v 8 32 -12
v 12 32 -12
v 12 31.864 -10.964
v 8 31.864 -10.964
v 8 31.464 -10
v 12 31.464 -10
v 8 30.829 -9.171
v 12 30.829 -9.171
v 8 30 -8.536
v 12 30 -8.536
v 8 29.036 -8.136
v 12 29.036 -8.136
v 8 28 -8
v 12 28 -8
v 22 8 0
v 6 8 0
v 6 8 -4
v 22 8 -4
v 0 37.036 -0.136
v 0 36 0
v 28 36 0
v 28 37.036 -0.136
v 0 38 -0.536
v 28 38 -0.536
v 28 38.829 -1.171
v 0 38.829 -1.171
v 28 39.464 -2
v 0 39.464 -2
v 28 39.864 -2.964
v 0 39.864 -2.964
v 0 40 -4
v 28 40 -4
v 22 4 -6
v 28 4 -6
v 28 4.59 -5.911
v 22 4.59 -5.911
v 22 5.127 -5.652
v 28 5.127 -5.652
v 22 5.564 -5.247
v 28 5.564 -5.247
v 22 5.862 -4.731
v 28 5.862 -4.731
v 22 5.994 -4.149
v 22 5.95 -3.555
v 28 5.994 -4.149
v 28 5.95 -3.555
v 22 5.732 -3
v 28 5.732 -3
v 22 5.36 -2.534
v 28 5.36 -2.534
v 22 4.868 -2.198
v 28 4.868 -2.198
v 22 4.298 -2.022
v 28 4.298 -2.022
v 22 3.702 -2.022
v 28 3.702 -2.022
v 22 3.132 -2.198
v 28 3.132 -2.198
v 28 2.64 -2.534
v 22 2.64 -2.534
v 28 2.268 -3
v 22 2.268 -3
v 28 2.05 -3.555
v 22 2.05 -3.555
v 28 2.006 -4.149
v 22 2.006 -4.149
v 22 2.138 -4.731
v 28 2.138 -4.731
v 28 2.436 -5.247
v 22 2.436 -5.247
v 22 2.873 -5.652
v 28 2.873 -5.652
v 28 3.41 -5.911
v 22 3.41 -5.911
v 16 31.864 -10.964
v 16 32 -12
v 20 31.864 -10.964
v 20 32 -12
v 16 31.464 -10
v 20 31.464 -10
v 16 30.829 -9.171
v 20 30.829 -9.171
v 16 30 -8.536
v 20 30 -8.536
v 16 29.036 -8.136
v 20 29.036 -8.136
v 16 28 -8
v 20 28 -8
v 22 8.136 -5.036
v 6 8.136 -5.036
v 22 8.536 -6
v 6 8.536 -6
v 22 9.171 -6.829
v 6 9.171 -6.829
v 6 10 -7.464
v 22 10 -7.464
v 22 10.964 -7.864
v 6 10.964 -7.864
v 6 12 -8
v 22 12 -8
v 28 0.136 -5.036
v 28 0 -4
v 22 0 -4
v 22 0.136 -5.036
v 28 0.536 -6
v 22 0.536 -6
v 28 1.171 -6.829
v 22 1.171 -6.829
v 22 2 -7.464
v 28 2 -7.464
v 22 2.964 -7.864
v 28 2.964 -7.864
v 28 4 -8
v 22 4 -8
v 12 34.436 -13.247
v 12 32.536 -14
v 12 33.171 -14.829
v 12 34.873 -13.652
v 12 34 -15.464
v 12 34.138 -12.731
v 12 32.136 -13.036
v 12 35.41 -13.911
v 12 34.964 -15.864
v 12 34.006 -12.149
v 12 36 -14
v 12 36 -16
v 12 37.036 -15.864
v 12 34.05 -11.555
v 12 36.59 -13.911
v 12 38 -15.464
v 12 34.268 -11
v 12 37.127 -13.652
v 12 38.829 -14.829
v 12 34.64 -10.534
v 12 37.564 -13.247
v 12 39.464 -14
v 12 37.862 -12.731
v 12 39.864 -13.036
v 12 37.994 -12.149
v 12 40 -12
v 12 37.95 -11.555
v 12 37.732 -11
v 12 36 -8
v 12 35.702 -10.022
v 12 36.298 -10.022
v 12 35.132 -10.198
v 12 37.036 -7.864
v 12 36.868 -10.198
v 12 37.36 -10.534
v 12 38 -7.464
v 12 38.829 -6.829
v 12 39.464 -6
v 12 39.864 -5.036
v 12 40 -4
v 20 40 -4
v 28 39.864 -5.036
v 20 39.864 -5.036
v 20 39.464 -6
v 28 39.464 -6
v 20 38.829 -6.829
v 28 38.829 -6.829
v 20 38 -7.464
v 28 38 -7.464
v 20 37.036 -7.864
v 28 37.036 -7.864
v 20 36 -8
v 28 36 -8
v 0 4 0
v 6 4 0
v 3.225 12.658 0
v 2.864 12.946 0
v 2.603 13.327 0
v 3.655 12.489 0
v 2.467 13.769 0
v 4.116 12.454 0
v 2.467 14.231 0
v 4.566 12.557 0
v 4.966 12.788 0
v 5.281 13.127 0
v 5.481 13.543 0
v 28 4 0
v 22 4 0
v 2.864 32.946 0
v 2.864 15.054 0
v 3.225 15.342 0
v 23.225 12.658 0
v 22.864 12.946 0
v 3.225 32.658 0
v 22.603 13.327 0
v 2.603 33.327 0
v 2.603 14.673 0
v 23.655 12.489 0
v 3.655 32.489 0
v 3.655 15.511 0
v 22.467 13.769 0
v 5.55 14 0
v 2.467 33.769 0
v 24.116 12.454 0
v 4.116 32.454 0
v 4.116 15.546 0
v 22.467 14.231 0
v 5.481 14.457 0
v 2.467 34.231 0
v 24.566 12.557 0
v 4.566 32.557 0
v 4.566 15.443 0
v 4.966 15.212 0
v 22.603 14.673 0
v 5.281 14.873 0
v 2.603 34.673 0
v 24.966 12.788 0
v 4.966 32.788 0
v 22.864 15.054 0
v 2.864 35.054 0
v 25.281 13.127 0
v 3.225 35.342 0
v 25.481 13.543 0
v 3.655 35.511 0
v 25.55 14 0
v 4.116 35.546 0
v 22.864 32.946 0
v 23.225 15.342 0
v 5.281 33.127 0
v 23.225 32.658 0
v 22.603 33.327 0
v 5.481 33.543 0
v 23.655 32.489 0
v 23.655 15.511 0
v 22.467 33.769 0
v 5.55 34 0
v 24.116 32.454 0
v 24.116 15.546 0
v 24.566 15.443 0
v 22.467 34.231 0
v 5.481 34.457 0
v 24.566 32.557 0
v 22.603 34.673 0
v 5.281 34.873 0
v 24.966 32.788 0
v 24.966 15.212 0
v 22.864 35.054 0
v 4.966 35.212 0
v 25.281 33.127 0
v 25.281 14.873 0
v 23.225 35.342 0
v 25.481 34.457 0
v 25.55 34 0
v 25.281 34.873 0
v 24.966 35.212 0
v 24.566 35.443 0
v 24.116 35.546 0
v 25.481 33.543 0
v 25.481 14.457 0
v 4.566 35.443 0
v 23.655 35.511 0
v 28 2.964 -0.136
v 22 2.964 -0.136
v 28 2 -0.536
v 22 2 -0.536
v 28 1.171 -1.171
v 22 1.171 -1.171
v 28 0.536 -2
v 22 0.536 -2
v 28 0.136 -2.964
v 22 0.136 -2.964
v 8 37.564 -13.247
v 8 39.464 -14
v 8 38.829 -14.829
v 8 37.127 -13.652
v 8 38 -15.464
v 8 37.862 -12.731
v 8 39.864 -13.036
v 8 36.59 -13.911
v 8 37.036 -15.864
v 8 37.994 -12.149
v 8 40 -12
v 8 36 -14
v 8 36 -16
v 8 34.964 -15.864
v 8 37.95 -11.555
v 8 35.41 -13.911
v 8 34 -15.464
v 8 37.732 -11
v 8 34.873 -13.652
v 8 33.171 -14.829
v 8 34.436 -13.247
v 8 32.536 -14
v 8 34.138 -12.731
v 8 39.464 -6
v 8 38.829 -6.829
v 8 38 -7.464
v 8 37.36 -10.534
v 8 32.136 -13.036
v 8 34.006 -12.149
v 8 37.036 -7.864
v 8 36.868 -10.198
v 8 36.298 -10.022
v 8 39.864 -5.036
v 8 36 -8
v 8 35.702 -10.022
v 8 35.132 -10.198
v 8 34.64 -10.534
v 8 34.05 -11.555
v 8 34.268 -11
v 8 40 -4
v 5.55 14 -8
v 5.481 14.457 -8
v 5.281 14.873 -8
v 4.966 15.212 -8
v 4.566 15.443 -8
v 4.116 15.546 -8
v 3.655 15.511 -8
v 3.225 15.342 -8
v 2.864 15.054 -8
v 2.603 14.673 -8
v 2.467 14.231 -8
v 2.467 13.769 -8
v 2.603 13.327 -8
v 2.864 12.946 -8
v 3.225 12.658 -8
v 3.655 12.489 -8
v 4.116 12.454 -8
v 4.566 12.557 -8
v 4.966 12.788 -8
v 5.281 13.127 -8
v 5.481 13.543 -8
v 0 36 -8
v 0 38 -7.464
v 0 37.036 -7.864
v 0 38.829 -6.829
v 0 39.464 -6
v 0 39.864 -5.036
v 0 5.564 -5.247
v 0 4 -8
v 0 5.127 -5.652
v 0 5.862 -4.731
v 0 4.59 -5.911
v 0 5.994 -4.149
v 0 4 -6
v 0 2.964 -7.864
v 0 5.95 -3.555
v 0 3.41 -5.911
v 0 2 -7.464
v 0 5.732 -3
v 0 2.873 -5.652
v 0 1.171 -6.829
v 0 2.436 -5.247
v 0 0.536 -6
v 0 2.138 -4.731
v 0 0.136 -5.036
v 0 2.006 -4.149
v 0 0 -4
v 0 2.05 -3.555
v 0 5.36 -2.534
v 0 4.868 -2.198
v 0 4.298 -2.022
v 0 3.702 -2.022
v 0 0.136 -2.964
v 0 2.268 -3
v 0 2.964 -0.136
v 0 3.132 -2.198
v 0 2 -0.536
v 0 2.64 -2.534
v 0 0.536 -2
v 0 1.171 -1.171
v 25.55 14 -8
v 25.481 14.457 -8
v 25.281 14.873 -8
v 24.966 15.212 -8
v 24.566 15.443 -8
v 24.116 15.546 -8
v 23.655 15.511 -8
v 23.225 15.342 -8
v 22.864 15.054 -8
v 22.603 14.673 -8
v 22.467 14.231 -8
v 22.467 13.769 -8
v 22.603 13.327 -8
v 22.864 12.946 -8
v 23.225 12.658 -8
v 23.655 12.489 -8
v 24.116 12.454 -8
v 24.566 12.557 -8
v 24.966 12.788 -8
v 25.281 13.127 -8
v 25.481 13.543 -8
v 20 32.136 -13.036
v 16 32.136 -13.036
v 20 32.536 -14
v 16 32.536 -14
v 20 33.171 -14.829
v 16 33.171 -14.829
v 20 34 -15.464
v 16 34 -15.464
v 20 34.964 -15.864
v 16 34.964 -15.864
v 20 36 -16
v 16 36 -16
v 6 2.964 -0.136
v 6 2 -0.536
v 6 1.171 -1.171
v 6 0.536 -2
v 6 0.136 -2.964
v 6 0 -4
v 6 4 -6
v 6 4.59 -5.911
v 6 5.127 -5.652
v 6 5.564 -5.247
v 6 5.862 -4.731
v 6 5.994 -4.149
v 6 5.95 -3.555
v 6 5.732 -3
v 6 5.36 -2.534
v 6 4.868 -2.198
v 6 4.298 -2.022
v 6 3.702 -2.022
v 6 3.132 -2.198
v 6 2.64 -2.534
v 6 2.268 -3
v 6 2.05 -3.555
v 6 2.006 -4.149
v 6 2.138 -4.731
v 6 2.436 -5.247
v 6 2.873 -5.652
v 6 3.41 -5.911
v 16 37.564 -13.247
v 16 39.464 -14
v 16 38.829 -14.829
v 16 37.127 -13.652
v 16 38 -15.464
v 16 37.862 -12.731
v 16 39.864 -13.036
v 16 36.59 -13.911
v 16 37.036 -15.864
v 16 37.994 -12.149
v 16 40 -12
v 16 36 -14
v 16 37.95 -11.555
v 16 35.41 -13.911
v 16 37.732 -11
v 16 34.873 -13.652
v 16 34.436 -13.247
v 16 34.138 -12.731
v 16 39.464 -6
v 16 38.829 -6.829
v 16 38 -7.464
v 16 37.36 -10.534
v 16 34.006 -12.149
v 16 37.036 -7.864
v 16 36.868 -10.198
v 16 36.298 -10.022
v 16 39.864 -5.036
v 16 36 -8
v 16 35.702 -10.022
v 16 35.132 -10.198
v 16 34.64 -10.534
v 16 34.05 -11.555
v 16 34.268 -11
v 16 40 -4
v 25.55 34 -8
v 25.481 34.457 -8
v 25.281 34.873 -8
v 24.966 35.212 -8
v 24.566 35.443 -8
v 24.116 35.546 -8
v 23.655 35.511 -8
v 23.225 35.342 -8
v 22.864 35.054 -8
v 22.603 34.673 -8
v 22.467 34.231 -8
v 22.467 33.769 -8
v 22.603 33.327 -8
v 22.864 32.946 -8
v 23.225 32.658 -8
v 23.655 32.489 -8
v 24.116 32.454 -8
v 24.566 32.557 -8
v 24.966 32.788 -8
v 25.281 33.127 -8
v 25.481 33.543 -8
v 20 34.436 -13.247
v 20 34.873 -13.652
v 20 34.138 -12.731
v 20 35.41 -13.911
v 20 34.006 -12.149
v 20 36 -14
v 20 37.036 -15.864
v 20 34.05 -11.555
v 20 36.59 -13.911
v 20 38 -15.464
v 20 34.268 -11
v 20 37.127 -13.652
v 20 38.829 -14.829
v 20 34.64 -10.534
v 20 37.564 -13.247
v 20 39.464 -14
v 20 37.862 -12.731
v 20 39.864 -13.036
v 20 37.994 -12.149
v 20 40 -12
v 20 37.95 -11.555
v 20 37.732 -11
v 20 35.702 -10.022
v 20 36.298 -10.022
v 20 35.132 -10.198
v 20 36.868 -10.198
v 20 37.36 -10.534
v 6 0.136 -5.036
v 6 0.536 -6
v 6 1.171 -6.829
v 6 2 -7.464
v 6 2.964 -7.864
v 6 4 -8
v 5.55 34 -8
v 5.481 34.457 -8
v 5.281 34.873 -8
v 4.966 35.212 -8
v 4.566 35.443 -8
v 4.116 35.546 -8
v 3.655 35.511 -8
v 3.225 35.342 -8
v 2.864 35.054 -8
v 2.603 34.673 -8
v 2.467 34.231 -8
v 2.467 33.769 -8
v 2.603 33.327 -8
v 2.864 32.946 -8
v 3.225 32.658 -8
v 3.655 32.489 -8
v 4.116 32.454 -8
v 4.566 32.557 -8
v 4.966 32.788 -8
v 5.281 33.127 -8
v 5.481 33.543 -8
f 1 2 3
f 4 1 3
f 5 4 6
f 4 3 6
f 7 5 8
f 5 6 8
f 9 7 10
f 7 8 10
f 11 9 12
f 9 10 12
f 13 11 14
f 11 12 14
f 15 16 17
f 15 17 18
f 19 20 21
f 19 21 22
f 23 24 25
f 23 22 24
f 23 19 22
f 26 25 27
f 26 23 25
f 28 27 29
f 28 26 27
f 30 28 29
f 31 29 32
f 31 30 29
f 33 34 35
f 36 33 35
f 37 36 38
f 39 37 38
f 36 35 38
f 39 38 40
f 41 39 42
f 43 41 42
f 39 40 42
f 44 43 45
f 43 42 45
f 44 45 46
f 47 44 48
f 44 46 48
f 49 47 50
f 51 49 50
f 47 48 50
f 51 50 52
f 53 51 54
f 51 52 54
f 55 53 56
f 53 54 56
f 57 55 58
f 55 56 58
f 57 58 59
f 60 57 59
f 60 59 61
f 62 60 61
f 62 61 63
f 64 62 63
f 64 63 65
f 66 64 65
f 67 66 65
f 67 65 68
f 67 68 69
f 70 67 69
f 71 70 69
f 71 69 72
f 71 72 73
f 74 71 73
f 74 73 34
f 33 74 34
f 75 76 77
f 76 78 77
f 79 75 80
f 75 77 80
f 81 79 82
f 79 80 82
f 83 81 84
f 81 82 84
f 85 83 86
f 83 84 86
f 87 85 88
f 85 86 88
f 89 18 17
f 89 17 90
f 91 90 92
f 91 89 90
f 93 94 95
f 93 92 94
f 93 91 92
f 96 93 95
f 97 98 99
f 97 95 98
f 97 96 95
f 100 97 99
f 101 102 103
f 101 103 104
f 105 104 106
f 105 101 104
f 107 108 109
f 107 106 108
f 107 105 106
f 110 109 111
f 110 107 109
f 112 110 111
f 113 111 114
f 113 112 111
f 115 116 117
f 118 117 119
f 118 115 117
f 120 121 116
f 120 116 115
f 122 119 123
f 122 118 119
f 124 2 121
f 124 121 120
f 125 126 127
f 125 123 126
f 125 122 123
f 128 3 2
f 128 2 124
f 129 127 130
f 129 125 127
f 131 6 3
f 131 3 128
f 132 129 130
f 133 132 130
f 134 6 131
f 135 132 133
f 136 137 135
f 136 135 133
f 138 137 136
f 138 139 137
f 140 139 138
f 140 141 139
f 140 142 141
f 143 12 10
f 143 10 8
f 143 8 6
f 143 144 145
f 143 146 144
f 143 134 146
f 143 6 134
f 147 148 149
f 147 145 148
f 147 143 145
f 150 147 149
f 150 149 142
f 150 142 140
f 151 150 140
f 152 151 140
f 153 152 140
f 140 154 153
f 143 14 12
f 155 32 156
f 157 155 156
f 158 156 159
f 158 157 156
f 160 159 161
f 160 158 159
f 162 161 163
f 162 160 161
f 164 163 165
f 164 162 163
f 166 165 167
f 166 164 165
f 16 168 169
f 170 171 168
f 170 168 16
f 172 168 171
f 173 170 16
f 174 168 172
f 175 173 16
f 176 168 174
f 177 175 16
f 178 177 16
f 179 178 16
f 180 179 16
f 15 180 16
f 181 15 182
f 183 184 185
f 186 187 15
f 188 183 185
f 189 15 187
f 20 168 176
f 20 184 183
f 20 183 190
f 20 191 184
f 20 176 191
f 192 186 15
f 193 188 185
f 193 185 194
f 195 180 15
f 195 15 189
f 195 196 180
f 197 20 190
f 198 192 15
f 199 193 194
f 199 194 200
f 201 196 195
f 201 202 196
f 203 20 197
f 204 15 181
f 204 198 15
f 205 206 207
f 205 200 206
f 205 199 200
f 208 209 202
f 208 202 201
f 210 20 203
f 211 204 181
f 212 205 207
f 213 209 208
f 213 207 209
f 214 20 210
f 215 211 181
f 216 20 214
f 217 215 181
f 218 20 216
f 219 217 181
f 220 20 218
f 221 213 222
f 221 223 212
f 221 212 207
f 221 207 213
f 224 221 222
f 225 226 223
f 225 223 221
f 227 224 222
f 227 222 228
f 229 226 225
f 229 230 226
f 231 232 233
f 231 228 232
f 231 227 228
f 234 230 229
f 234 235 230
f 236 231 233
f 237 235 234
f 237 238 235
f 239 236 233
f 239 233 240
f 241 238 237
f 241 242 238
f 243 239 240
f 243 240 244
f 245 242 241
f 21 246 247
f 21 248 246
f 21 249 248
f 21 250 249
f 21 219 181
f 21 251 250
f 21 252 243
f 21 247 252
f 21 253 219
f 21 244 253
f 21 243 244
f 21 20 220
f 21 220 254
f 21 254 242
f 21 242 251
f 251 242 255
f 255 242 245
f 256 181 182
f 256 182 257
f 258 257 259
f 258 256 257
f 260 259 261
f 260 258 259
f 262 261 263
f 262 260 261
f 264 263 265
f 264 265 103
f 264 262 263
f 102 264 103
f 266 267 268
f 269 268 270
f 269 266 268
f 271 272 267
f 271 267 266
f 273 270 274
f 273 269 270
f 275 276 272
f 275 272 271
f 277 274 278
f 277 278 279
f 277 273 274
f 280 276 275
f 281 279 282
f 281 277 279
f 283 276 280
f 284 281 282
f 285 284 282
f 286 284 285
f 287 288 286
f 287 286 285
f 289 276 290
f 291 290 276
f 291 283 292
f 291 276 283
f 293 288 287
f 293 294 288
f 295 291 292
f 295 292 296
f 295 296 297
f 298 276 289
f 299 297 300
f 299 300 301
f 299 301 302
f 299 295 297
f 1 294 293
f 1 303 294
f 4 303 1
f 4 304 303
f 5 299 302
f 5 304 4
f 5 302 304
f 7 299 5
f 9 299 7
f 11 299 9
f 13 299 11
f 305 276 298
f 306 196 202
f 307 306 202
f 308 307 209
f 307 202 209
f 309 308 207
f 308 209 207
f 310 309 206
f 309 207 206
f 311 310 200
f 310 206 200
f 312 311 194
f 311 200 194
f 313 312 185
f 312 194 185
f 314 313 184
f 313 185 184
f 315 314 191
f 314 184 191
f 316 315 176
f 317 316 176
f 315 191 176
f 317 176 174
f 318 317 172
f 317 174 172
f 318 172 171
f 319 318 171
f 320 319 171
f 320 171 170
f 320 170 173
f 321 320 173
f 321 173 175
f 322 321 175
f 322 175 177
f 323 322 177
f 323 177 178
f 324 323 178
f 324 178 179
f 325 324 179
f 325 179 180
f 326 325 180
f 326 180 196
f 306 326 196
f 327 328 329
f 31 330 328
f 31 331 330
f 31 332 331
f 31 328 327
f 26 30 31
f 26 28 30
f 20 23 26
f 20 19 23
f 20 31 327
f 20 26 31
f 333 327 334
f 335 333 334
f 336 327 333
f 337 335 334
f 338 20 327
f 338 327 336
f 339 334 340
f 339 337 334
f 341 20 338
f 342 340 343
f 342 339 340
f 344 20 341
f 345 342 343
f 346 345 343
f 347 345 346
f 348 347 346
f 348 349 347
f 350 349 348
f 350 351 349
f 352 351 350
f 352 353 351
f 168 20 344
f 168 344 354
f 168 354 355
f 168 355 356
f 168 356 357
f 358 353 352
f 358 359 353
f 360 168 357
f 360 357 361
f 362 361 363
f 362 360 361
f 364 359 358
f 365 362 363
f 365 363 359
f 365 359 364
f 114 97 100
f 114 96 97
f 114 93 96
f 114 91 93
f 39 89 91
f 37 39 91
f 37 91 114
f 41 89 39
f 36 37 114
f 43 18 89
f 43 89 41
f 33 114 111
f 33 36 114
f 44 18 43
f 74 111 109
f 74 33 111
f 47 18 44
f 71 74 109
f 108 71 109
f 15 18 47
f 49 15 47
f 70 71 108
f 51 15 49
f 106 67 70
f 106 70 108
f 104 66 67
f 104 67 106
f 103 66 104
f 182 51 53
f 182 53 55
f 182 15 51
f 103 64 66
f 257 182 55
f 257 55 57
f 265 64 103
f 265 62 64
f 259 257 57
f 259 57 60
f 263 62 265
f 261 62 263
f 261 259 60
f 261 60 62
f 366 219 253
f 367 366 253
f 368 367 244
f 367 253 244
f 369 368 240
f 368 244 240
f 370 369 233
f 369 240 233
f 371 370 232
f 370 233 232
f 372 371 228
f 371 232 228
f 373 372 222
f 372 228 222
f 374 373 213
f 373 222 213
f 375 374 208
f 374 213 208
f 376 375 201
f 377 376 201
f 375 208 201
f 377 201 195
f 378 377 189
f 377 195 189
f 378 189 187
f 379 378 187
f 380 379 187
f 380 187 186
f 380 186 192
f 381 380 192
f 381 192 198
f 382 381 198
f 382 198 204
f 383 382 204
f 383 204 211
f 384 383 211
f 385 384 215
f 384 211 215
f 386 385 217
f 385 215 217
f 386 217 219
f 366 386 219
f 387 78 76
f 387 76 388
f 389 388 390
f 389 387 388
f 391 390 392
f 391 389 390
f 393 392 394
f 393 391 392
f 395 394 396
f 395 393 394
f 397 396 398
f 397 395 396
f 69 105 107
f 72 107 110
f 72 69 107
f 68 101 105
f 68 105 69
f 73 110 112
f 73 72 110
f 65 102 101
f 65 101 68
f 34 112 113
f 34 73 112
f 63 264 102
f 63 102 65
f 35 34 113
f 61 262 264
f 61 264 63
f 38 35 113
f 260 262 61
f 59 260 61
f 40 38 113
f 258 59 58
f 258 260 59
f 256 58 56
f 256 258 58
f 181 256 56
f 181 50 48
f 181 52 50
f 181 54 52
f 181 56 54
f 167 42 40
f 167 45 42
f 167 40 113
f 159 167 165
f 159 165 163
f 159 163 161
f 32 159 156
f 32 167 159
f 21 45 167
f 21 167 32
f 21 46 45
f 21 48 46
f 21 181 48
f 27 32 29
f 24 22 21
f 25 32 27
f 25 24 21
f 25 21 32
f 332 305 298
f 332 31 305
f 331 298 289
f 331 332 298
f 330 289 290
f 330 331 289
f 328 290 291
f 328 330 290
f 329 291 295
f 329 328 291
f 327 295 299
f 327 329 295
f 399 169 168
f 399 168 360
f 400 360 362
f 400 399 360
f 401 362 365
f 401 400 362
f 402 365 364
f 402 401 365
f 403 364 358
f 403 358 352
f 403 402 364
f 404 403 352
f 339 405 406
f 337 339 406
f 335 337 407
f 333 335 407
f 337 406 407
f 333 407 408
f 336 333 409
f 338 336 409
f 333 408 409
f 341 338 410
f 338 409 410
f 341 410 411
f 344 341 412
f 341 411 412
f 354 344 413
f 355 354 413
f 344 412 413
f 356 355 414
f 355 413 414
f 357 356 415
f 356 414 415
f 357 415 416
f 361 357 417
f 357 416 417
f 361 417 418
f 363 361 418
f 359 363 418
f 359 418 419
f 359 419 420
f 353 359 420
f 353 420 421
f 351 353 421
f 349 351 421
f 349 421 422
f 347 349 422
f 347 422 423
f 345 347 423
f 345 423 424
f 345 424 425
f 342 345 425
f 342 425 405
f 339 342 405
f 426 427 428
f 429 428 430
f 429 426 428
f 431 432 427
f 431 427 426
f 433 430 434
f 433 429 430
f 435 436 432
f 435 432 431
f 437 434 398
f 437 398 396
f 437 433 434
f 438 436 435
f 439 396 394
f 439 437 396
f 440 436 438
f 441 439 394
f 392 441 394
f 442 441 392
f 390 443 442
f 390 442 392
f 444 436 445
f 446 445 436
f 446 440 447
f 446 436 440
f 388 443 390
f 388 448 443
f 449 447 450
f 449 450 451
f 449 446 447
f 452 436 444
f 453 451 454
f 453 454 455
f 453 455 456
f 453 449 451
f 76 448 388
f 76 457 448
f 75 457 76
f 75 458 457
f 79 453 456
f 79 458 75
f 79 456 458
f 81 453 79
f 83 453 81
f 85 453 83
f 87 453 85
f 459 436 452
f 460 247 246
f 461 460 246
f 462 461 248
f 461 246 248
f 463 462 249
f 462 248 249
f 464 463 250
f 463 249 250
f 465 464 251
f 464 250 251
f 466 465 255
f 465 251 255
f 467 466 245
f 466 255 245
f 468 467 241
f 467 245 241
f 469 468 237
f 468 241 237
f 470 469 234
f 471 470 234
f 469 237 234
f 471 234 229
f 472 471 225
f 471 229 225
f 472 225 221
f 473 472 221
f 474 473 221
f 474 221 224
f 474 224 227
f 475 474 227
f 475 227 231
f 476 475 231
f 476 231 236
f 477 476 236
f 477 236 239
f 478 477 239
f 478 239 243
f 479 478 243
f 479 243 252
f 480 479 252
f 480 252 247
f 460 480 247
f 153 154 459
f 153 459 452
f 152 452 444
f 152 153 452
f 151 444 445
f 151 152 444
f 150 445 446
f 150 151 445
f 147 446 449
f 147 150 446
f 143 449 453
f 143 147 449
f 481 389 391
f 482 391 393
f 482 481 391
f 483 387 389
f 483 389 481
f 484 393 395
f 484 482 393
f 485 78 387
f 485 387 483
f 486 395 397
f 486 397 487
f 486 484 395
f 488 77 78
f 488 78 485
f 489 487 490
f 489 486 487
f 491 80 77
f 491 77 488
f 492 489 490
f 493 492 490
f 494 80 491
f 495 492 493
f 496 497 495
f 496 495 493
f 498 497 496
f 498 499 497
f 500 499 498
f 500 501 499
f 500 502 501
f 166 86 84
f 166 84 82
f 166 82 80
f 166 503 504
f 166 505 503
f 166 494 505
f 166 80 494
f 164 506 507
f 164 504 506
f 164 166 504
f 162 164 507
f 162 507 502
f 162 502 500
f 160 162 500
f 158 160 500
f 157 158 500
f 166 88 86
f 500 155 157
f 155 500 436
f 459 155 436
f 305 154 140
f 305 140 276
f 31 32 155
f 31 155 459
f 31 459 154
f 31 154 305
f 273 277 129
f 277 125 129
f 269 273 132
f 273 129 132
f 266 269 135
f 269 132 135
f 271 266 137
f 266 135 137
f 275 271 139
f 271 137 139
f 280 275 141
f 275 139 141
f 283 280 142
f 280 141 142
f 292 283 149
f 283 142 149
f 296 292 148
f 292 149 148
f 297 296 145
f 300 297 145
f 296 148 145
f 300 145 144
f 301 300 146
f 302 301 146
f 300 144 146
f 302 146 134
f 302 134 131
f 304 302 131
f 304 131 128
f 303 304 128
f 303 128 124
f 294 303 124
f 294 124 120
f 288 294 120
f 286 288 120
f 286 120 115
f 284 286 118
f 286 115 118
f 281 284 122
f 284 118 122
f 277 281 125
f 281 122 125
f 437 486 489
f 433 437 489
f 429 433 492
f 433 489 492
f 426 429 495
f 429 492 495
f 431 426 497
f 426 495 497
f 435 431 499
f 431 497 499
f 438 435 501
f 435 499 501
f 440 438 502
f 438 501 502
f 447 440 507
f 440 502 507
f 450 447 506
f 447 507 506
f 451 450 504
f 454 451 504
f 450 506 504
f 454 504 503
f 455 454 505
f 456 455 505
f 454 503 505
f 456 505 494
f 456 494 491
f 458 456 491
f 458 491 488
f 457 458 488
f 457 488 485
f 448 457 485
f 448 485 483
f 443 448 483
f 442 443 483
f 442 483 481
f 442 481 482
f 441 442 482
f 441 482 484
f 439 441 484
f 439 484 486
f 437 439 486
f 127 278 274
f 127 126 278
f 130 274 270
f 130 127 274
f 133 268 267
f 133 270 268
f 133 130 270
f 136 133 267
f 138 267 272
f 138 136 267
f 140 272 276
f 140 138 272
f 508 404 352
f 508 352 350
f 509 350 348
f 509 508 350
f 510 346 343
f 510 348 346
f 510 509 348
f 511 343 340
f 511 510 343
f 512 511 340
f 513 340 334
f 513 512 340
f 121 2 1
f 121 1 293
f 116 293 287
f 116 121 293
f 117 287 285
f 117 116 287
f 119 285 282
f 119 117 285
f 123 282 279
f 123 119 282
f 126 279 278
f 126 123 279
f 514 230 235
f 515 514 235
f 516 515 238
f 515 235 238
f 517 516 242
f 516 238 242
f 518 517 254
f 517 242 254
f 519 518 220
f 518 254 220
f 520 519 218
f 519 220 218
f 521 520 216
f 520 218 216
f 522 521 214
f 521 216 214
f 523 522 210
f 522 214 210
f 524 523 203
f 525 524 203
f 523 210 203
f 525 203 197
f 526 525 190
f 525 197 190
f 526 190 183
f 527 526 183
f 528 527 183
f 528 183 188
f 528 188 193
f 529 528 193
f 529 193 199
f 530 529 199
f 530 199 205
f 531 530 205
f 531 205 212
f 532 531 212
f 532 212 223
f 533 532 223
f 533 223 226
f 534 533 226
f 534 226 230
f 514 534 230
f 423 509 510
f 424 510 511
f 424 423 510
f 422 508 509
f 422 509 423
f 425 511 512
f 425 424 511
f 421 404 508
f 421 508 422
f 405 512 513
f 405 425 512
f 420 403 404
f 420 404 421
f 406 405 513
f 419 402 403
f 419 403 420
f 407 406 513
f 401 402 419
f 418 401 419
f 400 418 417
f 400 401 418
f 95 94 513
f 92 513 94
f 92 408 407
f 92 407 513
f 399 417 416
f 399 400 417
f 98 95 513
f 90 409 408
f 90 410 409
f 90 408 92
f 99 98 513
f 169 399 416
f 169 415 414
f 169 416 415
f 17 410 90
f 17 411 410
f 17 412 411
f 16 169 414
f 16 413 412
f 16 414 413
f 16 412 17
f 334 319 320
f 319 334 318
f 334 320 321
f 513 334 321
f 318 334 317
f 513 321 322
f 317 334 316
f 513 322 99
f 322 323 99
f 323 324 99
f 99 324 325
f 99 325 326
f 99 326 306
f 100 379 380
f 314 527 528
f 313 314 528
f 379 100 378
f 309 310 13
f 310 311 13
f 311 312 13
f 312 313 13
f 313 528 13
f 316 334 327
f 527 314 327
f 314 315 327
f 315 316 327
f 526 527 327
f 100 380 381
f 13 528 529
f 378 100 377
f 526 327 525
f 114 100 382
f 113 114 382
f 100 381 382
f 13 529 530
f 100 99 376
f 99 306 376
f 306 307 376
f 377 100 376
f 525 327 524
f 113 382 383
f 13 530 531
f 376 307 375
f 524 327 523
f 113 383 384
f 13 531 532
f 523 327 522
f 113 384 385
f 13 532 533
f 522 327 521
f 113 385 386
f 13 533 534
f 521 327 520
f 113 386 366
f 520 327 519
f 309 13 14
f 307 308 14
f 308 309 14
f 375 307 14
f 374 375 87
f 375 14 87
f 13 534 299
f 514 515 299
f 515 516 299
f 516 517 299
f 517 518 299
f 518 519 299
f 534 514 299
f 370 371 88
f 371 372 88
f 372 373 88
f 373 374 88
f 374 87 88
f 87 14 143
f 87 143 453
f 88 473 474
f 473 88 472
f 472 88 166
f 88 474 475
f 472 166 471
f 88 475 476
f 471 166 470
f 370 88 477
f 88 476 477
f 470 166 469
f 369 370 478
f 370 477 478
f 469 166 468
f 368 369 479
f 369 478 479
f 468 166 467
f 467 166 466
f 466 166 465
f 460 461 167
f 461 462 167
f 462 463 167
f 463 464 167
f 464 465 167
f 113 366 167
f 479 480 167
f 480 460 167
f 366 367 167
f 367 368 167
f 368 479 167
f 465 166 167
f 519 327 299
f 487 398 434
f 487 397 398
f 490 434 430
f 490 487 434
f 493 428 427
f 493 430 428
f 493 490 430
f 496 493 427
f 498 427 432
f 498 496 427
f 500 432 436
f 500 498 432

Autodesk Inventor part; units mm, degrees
ref_plane "YZ Plane" through (0, 0, 0) normal (1, 0, 0) x (0, 1, 0)
ref_plane "XZ Plane" through (0, 0, 0) normal (0, 1, 0) x (-1, 0, 0)
ref_plane "XY Plane" through (0, 0, 0) normal (0, 0, 1) x (1, 0, 0)
sketch "Sketch1" plane through (0, 0, 0) normal (0, 0, 1) x (1, 0, 0)
  line L0 (0, 40) -> (0, 0)
  line L1 (0, 0) -> (6, 0)
  line L2 (6, 0) -> (6, 8)
  line L3 (6, 8) -> (22, 8)
  line L4 (22, 8) -> (22, 0)
  line L5 (22, 0) -> (28, 0)
  line L6 (28, 0) -> (28, 40)
  line L7 (28, 40) -> (0, 40)
  dimension "d0" = 6
  dimension "d1" = 6
  dimension "d2" = 16
  dimension "d3" = 40
  dimension "d4" = 8
extrude "Extrusion1" add sketch "Sketch1" against normal blind 8
sketch "Sketch2" plane through (28, 0, 0) normal (1, 0, 0) x (0, 0, -1)
  circle A0 centre (4, 4) radius 2
  line L0 (0, 0) -> (8, 0) projected
  line L1 (0, 0) -> (8, 0) projected
  point P0 (4, 0)
  dimension "d7" = 4
  dimension "d8" = 4
  dimension "d9" = 8
extrude "Extrusion2" cut sketch "Sketch2" against normal through all
fillet "Fillet1" radius 4 5 edges at (25, 0, 0) (3, 0, 0) (3, 0, -8) (25, 0, -8) (14, 8, -8)
sketch "Sketch3" plane through (0, 0, -8) normal (0, 0, -1) x (-1, 0, 0)
  line L0 (0, 40) -> (-28, 40) projected
  line L1 (-20, 40) -> (-16, 40)
  line L2 (-16, 40) -> (-16, 32)
  line L3 (-16, 32) -> (-20, 32)
  line L4 (-20, 32) -> (-20, 40)
  line L5 (-12, 40) -> (-8, 40)
  line L6 (-8, 40) -> (-8, 32)
  line L7 (-8, 32) -> (-12, 32)
  line L8 (-12, 32) -> (-12, 40)
  point P0 (0, 0)
  point P1 (-14, 40)
  dimension "d13" = 4
  dimension "d14" = 4
  dimension "d15" = 4
  dimension "d16" = 2
  dimension "d17" = 8
extrude "Extrusion3" add sketch "Sketch3" along normal blind 8
sketch "Sketch4" plane through (20, 32, -8) normal (1, 0, 0) x (0, 0, -1)
  circle A0 centre (4, 4) radius 2
  line L0 (8, 8) -> (8, 0) projected
  point P0 (-8, -32)
  dimension "d20" = 4
  dimension "d21" = 8
  dimension "d22" = 4
  dimension "d23" = 4
extrude "Extrusion4" cut sketch "Sketch4" against normal through all
fillet "Fillet2" radius 4 6 edges at (10, 40, -16) (18, 40, -16) (18, 32, -16) (10, 32, -16) (18, 32, -8) (10, 32, -8)
fillet "Fillet3" radius 4 4 edges at (14, 40, 0) (4, 40, -8) (14, 40, -8) (24, 40, -8)
sketch "Sketch5" plane through (0, 0, 0) normal (0, 0, 1) x (1, 0, 0)
  circle A0 centre (4, 34) radius 1.55
  line L0 (0, 36) -> (28, 36) construction
  line L1 (0, 36) -> (0, 4) construction
  circle A1 centre (4, 14) radius 1.55
  circle A2 centre (24, 34) radius 1.55
  circle A3 centre (24, 14) radius 1.55
  line L2 (28, 4) -> (28, 36) construction
  point P0 (0, 0)
  point P1 (14, 36)
  dimension "d30" = 20
  dimension "d33" = 20
  dimension "d36" = 2
  dimension "d37" = 10
  dimension "d38" = 3.1
extrude "Extrusion5" cut sketch "Sketch5" against normal up to surface (8 mm away)
equation "\"d0\" = d1"
equation "\"d4\" = 2 * arm_rod_diam"
equation "\"d5\" = 2 * arm_rod_diam"
equation "\"d7\" = arm_rod_diam"
equation "\"d8\" = 0.5 * d9"
equation "\"d12\" = arm_rod_diam"
equation "\"d13\" = d14"
equation "\"d16\" = 0.5 * d15"
equation "\"d18\" = 2 * arm_rod_diam"
equation "\"d20\" = arm_rod_diam"
equation "\"d22\" = 0.5 * d21"
equation "\"d23\" = d22"
equation "\"d26\" = arm_rod_diam"
equation "\"d27\" = arm_rod_diam"
equation "\"d37\" = 0.5 * d33"
equation "\"arm_rod_diam\" = 4"
properties part number "camera_arm"
